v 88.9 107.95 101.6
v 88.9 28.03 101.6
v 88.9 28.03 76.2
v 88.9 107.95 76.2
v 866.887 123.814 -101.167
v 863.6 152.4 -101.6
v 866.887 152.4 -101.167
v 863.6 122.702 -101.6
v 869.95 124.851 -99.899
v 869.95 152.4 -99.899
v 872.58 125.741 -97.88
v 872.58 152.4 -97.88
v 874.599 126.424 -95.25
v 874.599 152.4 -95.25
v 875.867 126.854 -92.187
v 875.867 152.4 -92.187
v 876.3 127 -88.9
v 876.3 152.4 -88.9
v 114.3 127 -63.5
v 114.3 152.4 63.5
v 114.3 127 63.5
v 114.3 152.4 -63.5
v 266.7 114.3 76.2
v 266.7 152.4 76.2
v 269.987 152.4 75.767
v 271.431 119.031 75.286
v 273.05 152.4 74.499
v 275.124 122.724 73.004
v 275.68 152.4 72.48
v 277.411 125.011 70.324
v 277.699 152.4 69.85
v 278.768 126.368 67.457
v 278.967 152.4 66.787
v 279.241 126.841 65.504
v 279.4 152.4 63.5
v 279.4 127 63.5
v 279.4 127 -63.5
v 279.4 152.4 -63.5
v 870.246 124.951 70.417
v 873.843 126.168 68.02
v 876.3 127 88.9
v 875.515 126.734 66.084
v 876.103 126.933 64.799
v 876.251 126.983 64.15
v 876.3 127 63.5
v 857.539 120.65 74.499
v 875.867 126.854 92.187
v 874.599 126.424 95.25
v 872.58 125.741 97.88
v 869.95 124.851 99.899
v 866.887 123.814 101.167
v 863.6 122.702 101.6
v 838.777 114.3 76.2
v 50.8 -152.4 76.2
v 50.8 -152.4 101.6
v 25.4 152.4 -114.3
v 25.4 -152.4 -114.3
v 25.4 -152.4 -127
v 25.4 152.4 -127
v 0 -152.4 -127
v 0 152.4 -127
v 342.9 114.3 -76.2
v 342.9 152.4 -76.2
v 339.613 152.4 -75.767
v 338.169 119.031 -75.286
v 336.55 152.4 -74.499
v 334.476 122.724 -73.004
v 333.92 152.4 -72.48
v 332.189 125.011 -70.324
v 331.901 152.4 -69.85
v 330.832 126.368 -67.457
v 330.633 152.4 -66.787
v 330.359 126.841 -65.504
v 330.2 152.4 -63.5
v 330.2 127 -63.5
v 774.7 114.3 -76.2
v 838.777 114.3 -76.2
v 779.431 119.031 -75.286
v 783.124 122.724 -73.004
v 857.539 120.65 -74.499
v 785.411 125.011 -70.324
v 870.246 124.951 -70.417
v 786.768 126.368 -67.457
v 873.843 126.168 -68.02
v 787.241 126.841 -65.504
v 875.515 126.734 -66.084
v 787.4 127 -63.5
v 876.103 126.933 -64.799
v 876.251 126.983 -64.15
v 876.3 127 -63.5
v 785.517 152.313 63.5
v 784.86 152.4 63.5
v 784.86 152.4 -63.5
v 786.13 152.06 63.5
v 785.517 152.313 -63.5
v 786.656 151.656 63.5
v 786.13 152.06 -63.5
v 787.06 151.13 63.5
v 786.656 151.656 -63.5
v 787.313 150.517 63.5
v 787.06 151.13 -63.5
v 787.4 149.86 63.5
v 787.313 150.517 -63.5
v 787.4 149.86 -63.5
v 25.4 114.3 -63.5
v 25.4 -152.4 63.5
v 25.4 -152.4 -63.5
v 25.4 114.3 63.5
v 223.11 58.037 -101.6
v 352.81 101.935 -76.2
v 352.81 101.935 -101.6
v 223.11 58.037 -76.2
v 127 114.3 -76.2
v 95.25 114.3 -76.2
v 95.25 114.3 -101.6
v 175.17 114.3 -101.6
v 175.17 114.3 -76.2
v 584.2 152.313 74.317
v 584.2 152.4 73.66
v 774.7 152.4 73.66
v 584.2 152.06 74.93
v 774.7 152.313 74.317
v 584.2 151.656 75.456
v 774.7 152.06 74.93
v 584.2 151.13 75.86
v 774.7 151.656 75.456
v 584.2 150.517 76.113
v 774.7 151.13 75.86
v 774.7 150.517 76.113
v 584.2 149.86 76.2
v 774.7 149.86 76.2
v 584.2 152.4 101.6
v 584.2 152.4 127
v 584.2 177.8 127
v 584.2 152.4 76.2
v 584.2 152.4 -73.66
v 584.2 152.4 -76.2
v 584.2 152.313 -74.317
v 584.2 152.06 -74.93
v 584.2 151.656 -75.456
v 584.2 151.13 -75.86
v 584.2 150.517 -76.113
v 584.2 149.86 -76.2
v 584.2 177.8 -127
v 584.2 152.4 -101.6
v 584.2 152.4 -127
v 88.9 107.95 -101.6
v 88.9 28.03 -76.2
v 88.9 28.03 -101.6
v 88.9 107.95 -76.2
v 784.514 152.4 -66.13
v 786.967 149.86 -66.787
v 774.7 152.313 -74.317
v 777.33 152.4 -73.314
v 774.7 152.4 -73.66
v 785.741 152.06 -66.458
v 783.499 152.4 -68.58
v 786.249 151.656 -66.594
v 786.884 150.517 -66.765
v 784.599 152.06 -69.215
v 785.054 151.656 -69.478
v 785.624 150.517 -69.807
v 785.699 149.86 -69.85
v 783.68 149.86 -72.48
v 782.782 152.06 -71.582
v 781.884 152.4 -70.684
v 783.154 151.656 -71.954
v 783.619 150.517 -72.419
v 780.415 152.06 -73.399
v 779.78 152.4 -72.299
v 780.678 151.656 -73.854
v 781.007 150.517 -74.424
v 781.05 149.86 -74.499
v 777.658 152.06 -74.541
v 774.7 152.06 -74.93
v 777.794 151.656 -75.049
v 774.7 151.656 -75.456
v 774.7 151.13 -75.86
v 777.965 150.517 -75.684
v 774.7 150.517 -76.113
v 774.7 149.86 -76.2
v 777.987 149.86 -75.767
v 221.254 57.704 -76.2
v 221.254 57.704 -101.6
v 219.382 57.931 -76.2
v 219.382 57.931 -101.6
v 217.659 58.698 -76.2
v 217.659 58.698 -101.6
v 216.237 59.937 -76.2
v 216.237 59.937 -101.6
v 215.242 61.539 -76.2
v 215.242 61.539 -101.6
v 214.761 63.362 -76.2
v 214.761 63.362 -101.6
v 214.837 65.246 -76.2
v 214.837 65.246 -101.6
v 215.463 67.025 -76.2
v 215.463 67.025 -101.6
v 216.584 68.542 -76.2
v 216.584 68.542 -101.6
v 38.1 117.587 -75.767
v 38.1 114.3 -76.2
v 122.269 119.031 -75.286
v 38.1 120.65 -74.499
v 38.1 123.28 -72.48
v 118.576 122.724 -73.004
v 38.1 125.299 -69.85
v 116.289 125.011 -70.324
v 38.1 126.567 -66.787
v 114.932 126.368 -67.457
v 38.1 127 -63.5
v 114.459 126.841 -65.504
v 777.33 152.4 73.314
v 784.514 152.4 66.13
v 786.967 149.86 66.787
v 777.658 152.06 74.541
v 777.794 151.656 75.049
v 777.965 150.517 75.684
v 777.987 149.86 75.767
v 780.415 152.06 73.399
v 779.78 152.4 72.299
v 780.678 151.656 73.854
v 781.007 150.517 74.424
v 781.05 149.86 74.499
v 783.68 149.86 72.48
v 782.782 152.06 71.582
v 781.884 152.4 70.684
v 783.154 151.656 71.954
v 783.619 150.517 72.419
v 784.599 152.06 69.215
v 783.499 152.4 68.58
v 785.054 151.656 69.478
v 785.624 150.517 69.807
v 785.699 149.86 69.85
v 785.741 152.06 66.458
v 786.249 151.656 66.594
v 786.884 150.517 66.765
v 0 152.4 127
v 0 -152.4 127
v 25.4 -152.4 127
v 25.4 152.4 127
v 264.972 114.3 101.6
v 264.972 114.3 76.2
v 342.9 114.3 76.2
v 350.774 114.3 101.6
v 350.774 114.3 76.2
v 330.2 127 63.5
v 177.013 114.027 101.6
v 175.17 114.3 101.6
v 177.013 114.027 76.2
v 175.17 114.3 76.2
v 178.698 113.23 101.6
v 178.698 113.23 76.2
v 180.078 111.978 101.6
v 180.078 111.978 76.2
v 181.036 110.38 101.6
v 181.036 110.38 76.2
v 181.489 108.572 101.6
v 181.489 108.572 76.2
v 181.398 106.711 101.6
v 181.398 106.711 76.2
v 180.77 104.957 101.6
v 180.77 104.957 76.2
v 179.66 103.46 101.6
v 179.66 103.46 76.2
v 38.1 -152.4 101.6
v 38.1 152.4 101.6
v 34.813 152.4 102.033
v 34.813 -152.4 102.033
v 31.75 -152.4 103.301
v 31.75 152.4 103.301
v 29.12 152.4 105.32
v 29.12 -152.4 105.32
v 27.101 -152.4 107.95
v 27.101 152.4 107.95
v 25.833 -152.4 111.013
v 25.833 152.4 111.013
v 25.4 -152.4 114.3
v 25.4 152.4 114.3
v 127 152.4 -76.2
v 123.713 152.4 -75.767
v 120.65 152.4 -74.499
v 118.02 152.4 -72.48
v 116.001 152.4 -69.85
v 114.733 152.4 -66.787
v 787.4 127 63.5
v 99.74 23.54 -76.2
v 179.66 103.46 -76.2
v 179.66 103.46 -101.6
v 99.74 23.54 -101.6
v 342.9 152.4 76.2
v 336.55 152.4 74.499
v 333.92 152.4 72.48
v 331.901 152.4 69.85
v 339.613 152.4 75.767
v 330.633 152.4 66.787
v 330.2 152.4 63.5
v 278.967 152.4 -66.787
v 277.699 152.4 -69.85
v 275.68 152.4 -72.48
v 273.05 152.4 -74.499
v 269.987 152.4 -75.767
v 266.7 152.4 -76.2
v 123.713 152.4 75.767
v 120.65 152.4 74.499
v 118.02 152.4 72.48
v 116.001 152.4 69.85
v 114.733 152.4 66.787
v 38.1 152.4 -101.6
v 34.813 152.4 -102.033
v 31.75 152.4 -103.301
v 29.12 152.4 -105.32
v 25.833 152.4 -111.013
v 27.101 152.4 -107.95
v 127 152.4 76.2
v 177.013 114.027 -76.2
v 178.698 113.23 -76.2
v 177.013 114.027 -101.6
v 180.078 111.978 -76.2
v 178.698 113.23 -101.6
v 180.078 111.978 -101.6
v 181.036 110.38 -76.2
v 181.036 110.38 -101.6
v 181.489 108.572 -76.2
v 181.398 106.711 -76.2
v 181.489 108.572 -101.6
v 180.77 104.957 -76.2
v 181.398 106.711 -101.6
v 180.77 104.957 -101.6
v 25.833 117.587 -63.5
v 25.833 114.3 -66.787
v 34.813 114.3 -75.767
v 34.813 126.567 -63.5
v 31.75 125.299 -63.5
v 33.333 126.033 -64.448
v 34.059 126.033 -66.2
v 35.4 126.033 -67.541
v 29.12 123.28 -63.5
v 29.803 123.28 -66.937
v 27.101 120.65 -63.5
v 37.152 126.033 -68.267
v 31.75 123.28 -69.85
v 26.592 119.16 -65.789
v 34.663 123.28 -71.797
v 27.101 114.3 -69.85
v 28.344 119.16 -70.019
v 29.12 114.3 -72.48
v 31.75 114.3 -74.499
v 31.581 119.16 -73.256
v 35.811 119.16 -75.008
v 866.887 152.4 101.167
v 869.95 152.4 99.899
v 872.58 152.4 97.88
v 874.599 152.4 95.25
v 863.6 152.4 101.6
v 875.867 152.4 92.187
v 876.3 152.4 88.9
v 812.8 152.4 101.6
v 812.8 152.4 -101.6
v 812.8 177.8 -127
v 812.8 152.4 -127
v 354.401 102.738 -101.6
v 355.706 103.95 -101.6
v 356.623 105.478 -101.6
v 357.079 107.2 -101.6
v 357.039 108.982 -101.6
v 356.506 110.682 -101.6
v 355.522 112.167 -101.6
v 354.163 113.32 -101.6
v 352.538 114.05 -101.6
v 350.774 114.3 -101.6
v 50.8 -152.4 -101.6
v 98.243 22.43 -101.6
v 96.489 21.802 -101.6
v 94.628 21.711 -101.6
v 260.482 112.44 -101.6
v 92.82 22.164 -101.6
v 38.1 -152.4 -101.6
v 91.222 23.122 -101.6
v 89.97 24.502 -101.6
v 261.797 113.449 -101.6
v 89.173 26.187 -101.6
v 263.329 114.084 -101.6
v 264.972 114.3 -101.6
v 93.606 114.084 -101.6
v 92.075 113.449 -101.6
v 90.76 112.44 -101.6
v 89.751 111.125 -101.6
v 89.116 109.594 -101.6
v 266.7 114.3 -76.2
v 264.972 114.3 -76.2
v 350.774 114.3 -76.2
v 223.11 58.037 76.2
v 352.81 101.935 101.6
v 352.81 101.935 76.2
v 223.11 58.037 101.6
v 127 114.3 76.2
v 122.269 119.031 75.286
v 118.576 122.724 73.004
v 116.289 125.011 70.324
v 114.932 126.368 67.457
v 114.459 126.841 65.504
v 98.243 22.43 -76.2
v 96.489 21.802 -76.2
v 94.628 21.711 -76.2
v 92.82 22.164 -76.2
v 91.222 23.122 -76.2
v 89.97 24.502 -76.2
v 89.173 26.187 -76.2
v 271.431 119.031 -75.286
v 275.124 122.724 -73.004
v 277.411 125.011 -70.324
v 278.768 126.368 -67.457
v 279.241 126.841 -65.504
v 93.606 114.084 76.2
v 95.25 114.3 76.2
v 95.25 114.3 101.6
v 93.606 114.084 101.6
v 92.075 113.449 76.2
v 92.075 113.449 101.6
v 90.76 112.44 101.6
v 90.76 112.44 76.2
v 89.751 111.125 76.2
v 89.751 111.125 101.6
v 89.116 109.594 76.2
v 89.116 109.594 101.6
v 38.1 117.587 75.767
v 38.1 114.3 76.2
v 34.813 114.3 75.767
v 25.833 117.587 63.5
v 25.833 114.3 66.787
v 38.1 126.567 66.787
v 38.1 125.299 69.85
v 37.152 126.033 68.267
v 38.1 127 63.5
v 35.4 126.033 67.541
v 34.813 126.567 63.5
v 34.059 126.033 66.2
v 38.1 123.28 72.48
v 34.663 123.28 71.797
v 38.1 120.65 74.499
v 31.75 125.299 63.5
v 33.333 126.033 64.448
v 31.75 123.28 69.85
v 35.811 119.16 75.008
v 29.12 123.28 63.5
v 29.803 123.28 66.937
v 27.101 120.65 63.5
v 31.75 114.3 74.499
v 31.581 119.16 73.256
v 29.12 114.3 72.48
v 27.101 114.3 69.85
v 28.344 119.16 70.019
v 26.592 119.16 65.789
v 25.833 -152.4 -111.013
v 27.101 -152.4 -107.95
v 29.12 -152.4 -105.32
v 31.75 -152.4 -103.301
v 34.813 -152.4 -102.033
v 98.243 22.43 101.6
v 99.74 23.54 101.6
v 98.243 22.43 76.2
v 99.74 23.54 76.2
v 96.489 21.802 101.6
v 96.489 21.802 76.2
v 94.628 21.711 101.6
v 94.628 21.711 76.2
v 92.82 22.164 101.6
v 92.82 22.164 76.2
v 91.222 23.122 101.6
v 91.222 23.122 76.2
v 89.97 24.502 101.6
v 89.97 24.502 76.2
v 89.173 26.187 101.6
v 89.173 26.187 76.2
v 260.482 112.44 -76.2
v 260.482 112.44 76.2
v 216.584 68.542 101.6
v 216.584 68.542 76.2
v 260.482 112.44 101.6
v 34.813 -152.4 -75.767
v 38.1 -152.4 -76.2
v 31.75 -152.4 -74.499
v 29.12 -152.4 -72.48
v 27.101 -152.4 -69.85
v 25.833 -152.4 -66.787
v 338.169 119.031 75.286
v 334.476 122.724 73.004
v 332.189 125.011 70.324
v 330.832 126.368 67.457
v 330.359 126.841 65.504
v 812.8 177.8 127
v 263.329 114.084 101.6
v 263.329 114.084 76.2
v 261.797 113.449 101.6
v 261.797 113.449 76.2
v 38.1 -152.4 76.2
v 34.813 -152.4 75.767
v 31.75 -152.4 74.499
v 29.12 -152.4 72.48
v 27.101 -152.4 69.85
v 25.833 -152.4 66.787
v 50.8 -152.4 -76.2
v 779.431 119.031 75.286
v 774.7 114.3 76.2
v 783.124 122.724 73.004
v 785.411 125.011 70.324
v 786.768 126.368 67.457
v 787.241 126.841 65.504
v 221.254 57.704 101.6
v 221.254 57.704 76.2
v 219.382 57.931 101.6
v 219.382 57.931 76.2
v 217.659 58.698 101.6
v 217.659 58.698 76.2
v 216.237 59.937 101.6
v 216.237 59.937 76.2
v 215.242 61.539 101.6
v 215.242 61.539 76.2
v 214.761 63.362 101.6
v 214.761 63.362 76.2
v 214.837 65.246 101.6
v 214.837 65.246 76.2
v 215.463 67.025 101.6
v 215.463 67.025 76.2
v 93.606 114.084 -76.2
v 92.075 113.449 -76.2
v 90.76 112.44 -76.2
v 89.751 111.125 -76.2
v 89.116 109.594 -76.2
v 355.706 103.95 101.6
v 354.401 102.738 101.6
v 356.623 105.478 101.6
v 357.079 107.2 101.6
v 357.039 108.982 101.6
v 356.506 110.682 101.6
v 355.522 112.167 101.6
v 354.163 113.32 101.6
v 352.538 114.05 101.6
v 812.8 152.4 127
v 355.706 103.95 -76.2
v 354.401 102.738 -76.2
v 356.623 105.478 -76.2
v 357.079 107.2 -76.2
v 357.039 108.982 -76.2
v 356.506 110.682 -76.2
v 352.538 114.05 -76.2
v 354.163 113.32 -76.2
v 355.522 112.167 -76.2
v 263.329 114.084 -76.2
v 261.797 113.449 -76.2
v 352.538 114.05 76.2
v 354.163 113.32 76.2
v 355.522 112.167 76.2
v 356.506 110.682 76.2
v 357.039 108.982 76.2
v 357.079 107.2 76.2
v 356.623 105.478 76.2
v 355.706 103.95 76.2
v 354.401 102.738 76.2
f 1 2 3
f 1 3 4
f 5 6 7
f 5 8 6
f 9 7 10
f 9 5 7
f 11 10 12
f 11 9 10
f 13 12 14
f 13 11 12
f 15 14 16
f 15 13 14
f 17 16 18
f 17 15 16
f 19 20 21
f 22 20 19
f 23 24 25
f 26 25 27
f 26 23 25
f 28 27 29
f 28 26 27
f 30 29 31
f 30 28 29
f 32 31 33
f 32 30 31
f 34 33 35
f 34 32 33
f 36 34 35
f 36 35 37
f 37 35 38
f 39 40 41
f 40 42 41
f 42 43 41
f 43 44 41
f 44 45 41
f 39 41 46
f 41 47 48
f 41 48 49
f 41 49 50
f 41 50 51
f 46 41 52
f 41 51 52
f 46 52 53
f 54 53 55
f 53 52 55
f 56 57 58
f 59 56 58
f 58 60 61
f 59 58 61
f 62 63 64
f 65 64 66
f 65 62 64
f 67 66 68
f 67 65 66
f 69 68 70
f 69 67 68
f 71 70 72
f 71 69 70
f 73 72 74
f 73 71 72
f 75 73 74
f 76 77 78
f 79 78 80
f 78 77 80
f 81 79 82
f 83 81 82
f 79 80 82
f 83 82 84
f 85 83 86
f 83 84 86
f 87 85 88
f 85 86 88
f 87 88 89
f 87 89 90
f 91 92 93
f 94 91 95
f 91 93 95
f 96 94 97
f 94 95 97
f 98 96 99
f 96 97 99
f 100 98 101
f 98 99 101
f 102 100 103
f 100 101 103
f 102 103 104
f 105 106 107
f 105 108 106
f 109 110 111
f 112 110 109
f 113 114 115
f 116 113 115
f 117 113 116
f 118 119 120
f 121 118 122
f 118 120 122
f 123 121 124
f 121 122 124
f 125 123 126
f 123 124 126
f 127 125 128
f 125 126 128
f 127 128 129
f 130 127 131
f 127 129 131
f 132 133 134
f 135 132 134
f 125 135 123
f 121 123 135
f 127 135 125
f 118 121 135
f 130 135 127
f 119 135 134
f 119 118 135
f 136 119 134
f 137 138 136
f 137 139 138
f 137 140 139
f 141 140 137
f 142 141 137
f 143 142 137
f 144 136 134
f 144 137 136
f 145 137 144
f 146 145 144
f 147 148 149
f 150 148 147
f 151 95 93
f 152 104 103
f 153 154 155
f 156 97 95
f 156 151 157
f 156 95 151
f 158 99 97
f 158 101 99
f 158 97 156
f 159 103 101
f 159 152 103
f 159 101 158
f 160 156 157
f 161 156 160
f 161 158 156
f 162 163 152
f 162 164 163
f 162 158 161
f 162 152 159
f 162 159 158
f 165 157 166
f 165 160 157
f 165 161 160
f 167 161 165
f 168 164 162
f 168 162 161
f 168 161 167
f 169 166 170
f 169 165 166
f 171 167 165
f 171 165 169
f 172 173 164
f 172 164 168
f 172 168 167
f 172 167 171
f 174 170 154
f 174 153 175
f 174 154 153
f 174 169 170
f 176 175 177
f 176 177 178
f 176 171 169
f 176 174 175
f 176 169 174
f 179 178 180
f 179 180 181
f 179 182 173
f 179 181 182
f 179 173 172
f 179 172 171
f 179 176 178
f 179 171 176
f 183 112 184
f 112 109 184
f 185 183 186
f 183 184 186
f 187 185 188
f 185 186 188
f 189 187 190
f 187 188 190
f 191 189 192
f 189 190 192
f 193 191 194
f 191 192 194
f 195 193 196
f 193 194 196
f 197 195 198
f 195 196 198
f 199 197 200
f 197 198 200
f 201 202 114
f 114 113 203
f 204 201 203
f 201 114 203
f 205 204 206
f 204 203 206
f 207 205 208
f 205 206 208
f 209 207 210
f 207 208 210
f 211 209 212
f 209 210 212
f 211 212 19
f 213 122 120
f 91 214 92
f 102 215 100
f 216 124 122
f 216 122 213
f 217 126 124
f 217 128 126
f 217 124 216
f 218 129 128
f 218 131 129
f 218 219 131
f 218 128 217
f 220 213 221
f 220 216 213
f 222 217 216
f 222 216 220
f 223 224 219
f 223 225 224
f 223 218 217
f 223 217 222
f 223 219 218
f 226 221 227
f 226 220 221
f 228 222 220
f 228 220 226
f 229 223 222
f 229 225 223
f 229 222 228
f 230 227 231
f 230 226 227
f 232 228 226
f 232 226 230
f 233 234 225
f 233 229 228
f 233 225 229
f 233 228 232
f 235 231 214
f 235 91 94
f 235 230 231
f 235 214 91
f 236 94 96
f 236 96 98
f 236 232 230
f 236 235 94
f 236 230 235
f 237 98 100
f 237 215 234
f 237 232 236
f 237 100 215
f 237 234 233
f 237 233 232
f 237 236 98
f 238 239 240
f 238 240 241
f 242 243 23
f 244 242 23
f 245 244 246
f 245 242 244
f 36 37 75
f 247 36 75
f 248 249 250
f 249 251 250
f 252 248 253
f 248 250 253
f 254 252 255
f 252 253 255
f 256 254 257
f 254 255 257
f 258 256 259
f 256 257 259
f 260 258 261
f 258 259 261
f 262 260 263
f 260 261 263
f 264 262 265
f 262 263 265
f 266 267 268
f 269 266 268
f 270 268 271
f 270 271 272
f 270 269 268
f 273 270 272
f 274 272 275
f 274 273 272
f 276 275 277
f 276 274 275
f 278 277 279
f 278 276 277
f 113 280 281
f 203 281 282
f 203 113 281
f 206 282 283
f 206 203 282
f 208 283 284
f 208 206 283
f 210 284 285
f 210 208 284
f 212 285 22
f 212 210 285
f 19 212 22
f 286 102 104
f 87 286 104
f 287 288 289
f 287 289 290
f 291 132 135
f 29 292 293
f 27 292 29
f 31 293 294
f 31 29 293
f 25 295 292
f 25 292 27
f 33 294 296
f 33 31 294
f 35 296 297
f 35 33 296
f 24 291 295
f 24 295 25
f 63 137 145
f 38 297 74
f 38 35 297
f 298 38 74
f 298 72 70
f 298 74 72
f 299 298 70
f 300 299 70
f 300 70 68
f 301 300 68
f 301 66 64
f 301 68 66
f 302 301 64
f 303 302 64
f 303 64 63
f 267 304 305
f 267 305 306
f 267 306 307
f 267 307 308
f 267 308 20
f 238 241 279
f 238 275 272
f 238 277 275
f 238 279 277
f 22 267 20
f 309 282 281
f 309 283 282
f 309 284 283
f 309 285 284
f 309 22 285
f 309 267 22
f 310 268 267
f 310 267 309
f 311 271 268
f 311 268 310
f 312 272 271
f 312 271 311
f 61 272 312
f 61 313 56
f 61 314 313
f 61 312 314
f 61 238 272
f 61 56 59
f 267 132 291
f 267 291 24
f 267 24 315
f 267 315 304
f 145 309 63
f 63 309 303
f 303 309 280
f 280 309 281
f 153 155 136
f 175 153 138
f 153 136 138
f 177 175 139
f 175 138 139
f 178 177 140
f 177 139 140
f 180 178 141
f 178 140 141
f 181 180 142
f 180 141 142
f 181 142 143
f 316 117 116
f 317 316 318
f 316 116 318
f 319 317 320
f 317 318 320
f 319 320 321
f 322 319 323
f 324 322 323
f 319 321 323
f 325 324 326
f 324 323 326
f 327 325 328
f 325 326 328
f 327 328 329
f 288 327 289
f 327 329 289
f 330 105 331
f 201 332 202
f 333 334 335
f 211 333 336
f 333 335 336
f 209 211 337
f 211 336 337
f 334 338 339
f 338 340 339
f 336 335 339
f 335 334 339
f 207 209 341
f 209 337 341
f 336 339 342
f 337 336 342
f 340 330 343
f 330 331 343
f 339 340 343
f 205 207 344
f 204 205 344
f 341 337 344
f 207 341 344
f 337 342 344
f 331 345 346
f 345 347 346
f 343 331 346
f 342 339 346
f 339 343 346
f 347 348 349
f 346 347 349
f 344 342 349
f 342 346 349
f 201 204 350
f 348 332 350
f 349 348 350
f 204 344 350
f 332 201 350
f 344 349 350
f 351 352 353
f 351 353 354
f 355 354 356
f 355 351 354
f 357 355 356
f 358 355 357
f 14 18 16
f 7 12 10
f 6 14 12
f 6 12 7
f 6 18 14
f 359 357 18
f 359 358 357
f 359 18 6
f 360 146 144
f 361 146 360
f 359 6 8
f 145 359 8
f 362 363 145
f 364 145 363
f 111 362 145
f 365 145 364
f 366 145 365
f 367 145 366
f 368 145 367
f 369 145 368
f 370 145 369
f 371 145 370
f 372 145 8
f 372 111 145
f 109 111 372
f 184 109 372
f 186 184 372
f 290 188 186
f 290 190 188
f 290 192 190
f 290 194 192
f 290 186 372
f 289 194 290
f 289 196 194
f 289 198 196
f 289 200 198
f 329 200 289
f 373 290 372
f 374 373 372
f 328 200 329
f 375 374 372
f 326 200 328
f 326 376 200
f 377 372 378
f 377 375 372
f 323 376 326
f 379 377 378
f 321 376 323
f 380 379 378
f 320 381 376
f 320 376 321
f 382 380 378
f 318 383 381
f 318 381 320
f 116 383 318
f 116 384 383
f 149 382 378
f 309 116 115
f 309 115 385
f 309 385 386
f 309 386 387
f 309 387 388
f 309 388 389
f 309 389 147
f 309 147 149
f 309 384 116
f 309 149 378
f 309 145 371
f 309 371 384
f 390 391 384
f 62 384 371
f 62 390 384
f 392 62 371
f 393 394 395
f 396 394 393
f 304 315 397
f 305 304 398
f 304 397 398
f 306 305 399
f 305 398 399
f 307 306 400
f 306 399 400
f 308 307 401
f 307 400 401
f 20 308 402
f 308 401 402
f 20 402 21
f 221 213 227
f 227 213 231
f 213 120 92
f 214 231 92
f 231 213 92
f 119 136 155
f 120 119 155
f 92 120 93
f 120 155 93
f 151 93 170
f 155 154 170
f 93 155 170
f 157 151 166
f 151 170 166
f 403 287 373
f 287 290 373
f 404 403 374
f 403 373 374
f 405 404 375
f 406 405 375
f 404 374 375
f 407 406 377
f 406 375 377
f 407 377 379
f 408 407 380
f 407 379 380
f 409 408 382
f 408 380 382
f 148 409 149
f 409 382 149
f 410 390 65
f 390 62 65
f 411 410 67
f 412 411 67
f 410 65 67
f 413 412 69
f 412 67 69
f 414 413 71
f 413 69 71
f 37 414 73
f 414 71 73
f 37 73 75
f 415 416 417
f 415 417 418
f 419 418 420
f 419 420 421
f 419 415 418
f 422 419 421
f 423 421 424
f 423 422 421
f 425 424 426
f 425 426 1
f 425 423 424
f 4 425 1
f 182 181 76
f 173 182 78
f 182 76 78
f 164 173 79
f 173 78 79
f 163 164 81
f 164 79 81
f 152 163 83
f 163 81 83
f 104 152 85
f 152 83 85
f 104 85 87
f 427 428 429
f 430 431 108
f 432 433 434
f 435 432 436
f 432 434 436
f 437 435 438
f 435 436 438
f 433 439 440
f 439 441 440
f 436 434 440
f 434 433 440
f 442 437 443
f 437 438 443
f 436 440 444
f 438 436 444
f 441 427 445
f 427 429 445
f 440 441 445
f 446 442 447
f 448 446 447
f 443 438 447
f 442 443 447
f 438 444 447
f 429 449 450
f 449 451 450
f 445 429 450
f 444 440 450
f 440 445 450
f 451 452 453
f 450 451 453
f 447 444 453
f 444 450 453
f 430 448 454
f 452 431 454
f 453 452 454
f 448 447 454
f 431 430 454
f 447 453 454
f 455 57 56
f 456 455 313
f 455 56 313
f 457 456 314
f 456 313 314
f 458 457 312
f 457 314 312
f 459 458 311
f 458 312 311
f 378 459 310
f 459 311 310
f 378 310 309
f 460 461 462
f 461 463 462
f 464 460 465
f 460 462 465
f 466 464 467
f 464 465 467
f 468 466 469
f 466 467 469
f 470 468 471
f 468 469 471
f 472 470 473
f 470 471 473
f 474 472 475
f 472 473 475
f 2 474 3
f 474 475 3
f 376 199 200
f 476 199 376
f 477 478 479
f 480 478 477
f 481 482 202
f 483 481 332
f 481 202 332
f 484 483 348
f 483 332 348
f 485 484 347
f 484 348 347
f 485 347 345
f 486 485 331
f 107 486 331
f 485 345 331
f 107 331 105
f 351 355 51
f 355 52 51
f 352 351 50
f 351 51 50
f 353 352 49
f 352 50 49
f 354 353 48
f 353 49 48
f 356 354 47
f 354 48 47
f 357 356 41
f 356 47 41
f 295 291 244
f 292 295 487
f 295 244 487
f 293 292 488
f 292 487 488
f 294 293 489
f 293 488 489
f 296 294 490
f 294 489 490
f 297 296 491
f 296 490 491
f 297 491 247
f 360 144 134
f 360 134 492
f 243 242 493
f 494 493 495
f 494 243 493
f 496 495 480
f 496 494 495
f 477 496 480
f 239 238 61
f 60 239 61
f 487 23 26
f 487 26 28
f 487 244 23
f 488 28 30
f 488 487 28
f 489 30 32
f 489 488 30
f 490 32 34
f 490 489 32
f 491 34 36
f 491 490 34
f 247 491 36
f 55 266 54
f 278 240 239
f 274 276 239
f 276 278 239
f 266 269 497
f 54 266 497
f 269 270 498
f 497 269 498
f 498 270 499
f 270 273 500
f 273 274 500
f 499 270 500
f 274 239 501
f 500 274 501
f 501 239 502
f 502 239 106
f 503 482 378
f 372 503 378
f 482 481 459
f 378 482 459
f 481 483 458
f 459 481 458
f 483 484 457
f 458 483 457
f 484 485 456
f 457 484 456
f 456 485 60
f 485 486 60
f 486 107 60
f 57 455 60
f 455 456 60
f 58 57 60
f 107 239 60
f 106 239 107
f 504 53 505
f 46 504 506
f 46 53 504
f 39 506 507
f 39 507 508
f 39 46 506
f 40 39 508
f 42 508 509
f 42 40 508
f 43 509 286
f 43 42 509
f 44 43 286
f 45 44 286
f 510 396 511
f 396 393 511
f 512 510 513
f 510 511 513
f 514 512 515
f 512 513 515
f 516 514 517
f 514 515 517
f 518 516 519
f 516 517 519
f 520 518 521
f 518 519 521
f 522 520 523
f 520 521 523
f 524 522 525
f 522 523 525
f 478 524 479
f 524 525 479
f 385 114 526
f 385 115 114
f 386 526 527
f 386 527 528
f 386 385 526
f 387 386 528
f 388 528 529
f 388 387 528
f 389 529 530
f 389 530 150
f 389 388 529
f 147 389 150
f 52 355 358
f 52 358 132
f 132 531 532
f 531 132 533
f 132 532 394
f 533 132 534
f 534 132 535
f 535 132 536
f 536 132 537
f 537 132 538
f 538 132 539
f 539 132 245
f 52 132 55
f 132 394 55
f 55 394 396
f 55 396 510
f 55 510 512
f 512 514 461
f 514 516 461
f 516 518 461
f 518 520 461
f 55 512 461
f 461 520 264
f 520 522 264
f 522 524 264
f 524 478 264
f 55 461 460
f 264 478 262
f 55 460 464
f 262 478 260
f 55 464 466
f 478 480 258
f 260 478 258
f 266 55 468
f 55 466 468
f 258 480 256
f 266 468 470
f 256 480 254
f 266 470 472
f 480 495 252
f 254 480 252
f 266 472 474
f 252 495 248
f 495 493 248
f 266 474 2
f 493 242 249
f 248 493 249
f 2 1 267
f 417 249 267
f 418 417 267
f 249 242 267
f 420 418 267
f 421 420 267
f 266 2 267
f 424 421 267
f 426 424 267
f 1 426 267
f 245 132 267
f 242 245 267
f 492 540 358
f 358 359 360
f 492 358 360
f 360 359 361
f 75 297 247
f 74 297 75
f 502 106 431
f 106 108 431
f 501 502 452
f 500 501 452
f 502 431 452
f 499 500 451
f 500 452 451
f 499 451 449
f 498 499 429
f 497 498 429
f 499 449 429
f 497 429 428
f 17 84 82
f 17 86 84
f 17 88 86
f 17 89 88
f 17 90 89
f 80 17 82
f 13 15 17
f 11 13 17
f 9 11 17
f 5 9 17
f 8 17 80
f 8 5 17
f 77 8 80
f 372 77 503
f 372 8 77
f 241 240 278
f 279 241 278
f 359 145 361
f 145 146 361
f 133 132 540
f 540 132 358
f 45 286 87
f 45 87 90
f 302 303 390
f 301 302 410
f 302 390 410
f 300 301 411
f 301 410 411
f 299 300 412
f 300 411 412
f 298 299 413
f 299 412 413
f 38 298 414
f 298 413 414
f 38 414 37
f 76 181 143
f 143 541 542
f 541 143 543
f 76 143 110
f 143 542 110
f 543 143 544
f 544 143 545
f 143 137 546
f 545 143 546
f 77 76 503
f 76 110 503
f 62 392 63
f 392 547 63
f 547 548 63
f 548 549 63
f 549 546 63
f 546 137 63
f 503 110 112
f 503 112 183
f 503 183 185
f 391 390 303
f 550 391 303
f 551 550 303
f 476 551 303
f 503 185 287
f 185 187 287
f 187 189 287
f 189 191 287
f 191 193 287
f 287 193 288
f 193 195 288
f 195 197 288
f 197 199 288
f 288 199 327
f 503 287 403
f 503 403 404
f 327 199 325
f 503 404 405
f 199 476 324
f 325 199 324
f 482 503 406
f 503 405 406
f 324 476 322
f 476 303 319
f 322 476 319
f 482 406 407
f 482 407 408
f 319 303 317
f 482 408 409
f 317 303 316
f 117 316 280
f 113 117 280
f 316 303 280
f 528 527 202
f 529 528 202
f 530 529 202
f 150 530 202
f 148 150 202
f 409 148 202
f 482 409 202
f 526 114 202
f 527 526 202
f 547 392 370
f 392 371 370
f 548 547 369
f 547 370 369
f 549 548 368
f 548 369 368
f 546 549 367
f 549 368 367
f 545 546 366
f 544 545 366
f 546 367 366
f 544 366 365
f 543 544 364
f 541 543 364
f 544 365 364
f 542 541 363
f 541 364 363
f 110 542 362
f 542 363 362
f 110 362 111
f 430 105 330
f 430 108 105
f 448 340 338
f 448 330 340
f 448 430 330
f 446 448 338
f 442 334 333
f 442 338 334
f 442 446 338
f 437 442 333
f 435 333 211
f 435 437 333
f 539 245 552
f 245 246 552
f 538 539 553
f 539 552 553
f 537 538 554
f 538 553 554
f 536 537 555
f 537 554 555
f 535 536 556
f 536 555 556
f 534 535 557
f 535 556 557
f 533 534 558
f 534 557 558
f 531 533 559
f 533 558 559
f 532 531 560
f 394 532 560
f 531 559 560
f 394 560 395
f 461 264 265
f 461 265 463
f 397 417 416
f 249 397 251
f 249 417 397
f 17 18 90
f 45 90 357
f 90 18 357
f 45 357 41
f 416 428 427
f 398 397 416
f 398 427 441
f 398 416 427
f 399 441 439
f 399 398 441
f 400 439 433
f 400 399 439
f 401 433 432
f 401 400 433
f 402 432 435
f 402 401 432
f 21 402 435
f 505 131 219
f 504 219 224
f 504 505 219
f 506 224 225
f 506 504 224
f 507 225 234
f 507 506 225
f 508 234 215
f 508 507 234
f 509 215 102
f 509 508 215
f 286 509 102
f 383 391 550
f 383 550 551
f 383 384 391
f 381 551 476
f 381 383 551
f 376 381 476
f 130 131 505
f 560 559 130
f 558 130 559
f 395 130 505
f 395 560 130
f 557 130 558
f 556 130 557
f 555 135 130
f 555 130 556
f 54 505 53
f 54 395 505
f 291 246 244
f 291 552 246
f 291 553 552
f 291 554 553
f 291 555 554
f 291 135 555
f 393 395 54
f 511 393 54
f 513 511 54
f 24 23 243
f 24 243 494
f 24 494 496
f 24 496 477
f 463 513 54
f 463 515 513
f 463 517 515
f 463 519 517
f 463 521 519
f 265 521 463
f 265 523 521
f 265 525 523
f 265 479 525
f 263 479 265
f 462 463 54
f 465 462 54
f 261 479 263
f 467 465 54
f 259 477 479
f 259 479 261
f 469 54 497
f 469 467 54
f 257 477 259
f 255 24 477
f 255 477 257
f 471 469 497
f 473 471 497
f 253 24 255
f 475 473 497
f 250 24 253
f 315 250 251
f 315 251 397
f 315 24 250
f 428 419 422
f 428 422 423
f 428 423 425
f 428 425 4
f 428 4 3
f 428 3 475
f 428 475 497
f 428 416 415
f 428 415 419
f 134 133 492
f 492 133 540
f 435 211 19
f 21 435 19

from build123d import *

# Parameters (mm, degrees)
BASE_SKETCH_W            = 254
BASE_SKETCH_H            = 304.8
BASE_DEPTH               = 25.4
RIGHT_TRIANGLE_DEPTH     = 25.4
LEFT_TRIANGLE_DEPTH      = 25.4
SUPPORT_BEAMS_SKETCH_W   = 114.3
SUPPORT_BEAMS_SKETCH_H   = 203.2
SUPPORT_BEAMS_SKETCH_W_2 = 50.8
SUPPORT_BEAMS_SKETCH_W_3 = 88.9
SUPPORT_BEAMS_DEPTH      = 25.4
FILLET1_R                = 12.7
TOP_PLATE_SKETCH_W       = 228.6
TOP_PLATE_SKETCH_H       = 254
TOP_PLATE_DEPTH          = 25.4
FILLET4_R                = 2.54
CUT_EXTRUDE1_DEPTH       = 229.6
FILLET6_R                = 6.35


with BuildPart() as part:
    # Base Sketch → Base (new body)
    with BuildSketch(Plane(origin=(0, 0, 0), x_dir=(0, 0, -1), z_dir=(1, 0, 0))):
        Rectangle(BASE_SKETCH_W, BASE_SKETCH_H)
    extrude(amount=BASE_DEPTH)

    # Right Triangle Sketch → Right Triangle (add)
    with BuildSketch(Plane.XY.offset(101.6)):
        Polygon((0, 152.4), (876.3, 152.4), (876.3, 127), (50.8, -152.4), (0, -152.4), align=None)
    extrude(amount=-RIGHT_TRIANGLE_DEPTH)

    # Left Triangle Sketch → Left Triangle (add)
    with BuildSketch(Plane(origin=(0, 0, -101.6), x_dir=(-1, 0, 0), z_dir=(0, 0, -1))):
        Polygon((0, 152.4), (-876.3, 152.4), (-876.3, 127), (-50.8, -152.4), (0, -152.4), align=None)
    extrude(amount=-LEFT_TRIANGLE_DEPTH)

    # Support Beams Sketch → Support Beams (add)
    with BuildSketch(Plane(origin=(0, 152.4, 0), x_dir=(1, 0, 0), z_dir=(0, 1, 0))):
        with Locations((57.15, 0)):
            Rectangle(SUPPORT_BEAMS_SKETCH_W, SUPPORT_BEAMS_SKETCH_H)
        with Locations((304.8, 0)):
            Rectangle(SUPPORT_BEAMS_SKETCH_W_2, SUPPORT_BEAMS_SKETCH_H)
        with Locations((831.85, 0)):
            Rectangle(SUPPORT_BEAMS_SKETCH_W_3, SUPPORT_BEAMS_SKETCH_H)
    extrude(amount=-SUPPORT_BEAMS_DEPTH)

    # Fillet1
    fillet1_edges = [part.edges().sort_by_distance(p)[0] for p in [
        (279.4, 139.7, 76.2),
        (330.2, 139.7, 76.2),
        (304.8, 127, 76.2),
        (304.8, 127, -76.2),
        (279.4, 139.7, -76.2),
        (330.2, 139.7, -76.2),
        (787.4, 139.7, 76.2),
        (831.85, 127, 76.2),
        (831.85, 127, -76.2),
        (787.4, 139.7, -76.2),
        (25.4, 0, 101.6),
        (876.3, 139.7, 101.6),
        (876.3, 139.7, -101.6),
        (25.4, 0, -101.6),
        (25.4, -12.7, -76.2),
        (25.4, -12.7, 76.2),
        (114.3, 139.7, 76.2),
        (69.85, 127, 76.2),
        (114.3, 139.7, -76.2),
        (25.4, 127, 0),
        (69.85, 127, -76.2),
    ]]
    fillet(fillet1_edges, radius=FILLET1_R)

    # Top Plate Sketch → Top Plate (add)
    with BuildSketch(Plane(origin=(0, 152.4, 0), x_dir=(1, 0, 0), z_dir=(0, 1, 0))):
        with Locations((698.5, 0)):
            Rectangle(TOP_PLATE_SKETCH_W, TOP_PLATE_SKETCH_H)
    extrude(amount=TOP_PLATE_DEPTH)

    # Fillet4
    fillet4_edges = [part.edges().sort_by_distance(p)[0] for p in [
        (787.4, 152.4, 0),
        (679.45, 152.4, 76.2),
        (783.680256121, 152.4, 72.480256121),
        (783.680256121, 152.4, -72.480256121),
        (679.45, 152.4, -76.2),
    ]]
    fillet(fillet4_edges, radius=FILLET4_R)

    # Sketch1 → Cut-Extrude1 (cut, through all)
    with BuildSketch(Plane.XY.offset(101.6)):
        Polygon((88.9, 12.7), (88.9, 114.3), (190.5, 114.3), align=None)
        Polygon((197.365304783, 49.323255814), (262.342048969, 114.3), (389.342048969, 114.3), align=None)
    extrude(amount=-CUT_EXTRUDE1_DEPTH, mode=Mode.SUBTRACT)

    # Fillet6
    fillet6_edges = [part.edges().sort_by_distance(p)[0] for p in [
        (190.5, 114.3, -88.9),
        (88.9, 12.7, -88.9),
        (88.9, 114.3, -88.9),
        (190.5, 114.3, 88.9),
        (88.9, 12.7, 88.9),
        (88.9, 114.3, 88.9),
        (389.342048969, 114.3, -88.9),
        (197.365304783, 49.323255814, -88.9),
        (262.342048969, 114.3, -88.9),
        (389.342048969, 114.3, 88.9),
        (197.365304783, 49.323255814, 88.9),
        (262.342048969, 114.3, 88.9),
    ]]
    fillet(fillet6_edges, radius=FILLET6_R)


solid = part.part
